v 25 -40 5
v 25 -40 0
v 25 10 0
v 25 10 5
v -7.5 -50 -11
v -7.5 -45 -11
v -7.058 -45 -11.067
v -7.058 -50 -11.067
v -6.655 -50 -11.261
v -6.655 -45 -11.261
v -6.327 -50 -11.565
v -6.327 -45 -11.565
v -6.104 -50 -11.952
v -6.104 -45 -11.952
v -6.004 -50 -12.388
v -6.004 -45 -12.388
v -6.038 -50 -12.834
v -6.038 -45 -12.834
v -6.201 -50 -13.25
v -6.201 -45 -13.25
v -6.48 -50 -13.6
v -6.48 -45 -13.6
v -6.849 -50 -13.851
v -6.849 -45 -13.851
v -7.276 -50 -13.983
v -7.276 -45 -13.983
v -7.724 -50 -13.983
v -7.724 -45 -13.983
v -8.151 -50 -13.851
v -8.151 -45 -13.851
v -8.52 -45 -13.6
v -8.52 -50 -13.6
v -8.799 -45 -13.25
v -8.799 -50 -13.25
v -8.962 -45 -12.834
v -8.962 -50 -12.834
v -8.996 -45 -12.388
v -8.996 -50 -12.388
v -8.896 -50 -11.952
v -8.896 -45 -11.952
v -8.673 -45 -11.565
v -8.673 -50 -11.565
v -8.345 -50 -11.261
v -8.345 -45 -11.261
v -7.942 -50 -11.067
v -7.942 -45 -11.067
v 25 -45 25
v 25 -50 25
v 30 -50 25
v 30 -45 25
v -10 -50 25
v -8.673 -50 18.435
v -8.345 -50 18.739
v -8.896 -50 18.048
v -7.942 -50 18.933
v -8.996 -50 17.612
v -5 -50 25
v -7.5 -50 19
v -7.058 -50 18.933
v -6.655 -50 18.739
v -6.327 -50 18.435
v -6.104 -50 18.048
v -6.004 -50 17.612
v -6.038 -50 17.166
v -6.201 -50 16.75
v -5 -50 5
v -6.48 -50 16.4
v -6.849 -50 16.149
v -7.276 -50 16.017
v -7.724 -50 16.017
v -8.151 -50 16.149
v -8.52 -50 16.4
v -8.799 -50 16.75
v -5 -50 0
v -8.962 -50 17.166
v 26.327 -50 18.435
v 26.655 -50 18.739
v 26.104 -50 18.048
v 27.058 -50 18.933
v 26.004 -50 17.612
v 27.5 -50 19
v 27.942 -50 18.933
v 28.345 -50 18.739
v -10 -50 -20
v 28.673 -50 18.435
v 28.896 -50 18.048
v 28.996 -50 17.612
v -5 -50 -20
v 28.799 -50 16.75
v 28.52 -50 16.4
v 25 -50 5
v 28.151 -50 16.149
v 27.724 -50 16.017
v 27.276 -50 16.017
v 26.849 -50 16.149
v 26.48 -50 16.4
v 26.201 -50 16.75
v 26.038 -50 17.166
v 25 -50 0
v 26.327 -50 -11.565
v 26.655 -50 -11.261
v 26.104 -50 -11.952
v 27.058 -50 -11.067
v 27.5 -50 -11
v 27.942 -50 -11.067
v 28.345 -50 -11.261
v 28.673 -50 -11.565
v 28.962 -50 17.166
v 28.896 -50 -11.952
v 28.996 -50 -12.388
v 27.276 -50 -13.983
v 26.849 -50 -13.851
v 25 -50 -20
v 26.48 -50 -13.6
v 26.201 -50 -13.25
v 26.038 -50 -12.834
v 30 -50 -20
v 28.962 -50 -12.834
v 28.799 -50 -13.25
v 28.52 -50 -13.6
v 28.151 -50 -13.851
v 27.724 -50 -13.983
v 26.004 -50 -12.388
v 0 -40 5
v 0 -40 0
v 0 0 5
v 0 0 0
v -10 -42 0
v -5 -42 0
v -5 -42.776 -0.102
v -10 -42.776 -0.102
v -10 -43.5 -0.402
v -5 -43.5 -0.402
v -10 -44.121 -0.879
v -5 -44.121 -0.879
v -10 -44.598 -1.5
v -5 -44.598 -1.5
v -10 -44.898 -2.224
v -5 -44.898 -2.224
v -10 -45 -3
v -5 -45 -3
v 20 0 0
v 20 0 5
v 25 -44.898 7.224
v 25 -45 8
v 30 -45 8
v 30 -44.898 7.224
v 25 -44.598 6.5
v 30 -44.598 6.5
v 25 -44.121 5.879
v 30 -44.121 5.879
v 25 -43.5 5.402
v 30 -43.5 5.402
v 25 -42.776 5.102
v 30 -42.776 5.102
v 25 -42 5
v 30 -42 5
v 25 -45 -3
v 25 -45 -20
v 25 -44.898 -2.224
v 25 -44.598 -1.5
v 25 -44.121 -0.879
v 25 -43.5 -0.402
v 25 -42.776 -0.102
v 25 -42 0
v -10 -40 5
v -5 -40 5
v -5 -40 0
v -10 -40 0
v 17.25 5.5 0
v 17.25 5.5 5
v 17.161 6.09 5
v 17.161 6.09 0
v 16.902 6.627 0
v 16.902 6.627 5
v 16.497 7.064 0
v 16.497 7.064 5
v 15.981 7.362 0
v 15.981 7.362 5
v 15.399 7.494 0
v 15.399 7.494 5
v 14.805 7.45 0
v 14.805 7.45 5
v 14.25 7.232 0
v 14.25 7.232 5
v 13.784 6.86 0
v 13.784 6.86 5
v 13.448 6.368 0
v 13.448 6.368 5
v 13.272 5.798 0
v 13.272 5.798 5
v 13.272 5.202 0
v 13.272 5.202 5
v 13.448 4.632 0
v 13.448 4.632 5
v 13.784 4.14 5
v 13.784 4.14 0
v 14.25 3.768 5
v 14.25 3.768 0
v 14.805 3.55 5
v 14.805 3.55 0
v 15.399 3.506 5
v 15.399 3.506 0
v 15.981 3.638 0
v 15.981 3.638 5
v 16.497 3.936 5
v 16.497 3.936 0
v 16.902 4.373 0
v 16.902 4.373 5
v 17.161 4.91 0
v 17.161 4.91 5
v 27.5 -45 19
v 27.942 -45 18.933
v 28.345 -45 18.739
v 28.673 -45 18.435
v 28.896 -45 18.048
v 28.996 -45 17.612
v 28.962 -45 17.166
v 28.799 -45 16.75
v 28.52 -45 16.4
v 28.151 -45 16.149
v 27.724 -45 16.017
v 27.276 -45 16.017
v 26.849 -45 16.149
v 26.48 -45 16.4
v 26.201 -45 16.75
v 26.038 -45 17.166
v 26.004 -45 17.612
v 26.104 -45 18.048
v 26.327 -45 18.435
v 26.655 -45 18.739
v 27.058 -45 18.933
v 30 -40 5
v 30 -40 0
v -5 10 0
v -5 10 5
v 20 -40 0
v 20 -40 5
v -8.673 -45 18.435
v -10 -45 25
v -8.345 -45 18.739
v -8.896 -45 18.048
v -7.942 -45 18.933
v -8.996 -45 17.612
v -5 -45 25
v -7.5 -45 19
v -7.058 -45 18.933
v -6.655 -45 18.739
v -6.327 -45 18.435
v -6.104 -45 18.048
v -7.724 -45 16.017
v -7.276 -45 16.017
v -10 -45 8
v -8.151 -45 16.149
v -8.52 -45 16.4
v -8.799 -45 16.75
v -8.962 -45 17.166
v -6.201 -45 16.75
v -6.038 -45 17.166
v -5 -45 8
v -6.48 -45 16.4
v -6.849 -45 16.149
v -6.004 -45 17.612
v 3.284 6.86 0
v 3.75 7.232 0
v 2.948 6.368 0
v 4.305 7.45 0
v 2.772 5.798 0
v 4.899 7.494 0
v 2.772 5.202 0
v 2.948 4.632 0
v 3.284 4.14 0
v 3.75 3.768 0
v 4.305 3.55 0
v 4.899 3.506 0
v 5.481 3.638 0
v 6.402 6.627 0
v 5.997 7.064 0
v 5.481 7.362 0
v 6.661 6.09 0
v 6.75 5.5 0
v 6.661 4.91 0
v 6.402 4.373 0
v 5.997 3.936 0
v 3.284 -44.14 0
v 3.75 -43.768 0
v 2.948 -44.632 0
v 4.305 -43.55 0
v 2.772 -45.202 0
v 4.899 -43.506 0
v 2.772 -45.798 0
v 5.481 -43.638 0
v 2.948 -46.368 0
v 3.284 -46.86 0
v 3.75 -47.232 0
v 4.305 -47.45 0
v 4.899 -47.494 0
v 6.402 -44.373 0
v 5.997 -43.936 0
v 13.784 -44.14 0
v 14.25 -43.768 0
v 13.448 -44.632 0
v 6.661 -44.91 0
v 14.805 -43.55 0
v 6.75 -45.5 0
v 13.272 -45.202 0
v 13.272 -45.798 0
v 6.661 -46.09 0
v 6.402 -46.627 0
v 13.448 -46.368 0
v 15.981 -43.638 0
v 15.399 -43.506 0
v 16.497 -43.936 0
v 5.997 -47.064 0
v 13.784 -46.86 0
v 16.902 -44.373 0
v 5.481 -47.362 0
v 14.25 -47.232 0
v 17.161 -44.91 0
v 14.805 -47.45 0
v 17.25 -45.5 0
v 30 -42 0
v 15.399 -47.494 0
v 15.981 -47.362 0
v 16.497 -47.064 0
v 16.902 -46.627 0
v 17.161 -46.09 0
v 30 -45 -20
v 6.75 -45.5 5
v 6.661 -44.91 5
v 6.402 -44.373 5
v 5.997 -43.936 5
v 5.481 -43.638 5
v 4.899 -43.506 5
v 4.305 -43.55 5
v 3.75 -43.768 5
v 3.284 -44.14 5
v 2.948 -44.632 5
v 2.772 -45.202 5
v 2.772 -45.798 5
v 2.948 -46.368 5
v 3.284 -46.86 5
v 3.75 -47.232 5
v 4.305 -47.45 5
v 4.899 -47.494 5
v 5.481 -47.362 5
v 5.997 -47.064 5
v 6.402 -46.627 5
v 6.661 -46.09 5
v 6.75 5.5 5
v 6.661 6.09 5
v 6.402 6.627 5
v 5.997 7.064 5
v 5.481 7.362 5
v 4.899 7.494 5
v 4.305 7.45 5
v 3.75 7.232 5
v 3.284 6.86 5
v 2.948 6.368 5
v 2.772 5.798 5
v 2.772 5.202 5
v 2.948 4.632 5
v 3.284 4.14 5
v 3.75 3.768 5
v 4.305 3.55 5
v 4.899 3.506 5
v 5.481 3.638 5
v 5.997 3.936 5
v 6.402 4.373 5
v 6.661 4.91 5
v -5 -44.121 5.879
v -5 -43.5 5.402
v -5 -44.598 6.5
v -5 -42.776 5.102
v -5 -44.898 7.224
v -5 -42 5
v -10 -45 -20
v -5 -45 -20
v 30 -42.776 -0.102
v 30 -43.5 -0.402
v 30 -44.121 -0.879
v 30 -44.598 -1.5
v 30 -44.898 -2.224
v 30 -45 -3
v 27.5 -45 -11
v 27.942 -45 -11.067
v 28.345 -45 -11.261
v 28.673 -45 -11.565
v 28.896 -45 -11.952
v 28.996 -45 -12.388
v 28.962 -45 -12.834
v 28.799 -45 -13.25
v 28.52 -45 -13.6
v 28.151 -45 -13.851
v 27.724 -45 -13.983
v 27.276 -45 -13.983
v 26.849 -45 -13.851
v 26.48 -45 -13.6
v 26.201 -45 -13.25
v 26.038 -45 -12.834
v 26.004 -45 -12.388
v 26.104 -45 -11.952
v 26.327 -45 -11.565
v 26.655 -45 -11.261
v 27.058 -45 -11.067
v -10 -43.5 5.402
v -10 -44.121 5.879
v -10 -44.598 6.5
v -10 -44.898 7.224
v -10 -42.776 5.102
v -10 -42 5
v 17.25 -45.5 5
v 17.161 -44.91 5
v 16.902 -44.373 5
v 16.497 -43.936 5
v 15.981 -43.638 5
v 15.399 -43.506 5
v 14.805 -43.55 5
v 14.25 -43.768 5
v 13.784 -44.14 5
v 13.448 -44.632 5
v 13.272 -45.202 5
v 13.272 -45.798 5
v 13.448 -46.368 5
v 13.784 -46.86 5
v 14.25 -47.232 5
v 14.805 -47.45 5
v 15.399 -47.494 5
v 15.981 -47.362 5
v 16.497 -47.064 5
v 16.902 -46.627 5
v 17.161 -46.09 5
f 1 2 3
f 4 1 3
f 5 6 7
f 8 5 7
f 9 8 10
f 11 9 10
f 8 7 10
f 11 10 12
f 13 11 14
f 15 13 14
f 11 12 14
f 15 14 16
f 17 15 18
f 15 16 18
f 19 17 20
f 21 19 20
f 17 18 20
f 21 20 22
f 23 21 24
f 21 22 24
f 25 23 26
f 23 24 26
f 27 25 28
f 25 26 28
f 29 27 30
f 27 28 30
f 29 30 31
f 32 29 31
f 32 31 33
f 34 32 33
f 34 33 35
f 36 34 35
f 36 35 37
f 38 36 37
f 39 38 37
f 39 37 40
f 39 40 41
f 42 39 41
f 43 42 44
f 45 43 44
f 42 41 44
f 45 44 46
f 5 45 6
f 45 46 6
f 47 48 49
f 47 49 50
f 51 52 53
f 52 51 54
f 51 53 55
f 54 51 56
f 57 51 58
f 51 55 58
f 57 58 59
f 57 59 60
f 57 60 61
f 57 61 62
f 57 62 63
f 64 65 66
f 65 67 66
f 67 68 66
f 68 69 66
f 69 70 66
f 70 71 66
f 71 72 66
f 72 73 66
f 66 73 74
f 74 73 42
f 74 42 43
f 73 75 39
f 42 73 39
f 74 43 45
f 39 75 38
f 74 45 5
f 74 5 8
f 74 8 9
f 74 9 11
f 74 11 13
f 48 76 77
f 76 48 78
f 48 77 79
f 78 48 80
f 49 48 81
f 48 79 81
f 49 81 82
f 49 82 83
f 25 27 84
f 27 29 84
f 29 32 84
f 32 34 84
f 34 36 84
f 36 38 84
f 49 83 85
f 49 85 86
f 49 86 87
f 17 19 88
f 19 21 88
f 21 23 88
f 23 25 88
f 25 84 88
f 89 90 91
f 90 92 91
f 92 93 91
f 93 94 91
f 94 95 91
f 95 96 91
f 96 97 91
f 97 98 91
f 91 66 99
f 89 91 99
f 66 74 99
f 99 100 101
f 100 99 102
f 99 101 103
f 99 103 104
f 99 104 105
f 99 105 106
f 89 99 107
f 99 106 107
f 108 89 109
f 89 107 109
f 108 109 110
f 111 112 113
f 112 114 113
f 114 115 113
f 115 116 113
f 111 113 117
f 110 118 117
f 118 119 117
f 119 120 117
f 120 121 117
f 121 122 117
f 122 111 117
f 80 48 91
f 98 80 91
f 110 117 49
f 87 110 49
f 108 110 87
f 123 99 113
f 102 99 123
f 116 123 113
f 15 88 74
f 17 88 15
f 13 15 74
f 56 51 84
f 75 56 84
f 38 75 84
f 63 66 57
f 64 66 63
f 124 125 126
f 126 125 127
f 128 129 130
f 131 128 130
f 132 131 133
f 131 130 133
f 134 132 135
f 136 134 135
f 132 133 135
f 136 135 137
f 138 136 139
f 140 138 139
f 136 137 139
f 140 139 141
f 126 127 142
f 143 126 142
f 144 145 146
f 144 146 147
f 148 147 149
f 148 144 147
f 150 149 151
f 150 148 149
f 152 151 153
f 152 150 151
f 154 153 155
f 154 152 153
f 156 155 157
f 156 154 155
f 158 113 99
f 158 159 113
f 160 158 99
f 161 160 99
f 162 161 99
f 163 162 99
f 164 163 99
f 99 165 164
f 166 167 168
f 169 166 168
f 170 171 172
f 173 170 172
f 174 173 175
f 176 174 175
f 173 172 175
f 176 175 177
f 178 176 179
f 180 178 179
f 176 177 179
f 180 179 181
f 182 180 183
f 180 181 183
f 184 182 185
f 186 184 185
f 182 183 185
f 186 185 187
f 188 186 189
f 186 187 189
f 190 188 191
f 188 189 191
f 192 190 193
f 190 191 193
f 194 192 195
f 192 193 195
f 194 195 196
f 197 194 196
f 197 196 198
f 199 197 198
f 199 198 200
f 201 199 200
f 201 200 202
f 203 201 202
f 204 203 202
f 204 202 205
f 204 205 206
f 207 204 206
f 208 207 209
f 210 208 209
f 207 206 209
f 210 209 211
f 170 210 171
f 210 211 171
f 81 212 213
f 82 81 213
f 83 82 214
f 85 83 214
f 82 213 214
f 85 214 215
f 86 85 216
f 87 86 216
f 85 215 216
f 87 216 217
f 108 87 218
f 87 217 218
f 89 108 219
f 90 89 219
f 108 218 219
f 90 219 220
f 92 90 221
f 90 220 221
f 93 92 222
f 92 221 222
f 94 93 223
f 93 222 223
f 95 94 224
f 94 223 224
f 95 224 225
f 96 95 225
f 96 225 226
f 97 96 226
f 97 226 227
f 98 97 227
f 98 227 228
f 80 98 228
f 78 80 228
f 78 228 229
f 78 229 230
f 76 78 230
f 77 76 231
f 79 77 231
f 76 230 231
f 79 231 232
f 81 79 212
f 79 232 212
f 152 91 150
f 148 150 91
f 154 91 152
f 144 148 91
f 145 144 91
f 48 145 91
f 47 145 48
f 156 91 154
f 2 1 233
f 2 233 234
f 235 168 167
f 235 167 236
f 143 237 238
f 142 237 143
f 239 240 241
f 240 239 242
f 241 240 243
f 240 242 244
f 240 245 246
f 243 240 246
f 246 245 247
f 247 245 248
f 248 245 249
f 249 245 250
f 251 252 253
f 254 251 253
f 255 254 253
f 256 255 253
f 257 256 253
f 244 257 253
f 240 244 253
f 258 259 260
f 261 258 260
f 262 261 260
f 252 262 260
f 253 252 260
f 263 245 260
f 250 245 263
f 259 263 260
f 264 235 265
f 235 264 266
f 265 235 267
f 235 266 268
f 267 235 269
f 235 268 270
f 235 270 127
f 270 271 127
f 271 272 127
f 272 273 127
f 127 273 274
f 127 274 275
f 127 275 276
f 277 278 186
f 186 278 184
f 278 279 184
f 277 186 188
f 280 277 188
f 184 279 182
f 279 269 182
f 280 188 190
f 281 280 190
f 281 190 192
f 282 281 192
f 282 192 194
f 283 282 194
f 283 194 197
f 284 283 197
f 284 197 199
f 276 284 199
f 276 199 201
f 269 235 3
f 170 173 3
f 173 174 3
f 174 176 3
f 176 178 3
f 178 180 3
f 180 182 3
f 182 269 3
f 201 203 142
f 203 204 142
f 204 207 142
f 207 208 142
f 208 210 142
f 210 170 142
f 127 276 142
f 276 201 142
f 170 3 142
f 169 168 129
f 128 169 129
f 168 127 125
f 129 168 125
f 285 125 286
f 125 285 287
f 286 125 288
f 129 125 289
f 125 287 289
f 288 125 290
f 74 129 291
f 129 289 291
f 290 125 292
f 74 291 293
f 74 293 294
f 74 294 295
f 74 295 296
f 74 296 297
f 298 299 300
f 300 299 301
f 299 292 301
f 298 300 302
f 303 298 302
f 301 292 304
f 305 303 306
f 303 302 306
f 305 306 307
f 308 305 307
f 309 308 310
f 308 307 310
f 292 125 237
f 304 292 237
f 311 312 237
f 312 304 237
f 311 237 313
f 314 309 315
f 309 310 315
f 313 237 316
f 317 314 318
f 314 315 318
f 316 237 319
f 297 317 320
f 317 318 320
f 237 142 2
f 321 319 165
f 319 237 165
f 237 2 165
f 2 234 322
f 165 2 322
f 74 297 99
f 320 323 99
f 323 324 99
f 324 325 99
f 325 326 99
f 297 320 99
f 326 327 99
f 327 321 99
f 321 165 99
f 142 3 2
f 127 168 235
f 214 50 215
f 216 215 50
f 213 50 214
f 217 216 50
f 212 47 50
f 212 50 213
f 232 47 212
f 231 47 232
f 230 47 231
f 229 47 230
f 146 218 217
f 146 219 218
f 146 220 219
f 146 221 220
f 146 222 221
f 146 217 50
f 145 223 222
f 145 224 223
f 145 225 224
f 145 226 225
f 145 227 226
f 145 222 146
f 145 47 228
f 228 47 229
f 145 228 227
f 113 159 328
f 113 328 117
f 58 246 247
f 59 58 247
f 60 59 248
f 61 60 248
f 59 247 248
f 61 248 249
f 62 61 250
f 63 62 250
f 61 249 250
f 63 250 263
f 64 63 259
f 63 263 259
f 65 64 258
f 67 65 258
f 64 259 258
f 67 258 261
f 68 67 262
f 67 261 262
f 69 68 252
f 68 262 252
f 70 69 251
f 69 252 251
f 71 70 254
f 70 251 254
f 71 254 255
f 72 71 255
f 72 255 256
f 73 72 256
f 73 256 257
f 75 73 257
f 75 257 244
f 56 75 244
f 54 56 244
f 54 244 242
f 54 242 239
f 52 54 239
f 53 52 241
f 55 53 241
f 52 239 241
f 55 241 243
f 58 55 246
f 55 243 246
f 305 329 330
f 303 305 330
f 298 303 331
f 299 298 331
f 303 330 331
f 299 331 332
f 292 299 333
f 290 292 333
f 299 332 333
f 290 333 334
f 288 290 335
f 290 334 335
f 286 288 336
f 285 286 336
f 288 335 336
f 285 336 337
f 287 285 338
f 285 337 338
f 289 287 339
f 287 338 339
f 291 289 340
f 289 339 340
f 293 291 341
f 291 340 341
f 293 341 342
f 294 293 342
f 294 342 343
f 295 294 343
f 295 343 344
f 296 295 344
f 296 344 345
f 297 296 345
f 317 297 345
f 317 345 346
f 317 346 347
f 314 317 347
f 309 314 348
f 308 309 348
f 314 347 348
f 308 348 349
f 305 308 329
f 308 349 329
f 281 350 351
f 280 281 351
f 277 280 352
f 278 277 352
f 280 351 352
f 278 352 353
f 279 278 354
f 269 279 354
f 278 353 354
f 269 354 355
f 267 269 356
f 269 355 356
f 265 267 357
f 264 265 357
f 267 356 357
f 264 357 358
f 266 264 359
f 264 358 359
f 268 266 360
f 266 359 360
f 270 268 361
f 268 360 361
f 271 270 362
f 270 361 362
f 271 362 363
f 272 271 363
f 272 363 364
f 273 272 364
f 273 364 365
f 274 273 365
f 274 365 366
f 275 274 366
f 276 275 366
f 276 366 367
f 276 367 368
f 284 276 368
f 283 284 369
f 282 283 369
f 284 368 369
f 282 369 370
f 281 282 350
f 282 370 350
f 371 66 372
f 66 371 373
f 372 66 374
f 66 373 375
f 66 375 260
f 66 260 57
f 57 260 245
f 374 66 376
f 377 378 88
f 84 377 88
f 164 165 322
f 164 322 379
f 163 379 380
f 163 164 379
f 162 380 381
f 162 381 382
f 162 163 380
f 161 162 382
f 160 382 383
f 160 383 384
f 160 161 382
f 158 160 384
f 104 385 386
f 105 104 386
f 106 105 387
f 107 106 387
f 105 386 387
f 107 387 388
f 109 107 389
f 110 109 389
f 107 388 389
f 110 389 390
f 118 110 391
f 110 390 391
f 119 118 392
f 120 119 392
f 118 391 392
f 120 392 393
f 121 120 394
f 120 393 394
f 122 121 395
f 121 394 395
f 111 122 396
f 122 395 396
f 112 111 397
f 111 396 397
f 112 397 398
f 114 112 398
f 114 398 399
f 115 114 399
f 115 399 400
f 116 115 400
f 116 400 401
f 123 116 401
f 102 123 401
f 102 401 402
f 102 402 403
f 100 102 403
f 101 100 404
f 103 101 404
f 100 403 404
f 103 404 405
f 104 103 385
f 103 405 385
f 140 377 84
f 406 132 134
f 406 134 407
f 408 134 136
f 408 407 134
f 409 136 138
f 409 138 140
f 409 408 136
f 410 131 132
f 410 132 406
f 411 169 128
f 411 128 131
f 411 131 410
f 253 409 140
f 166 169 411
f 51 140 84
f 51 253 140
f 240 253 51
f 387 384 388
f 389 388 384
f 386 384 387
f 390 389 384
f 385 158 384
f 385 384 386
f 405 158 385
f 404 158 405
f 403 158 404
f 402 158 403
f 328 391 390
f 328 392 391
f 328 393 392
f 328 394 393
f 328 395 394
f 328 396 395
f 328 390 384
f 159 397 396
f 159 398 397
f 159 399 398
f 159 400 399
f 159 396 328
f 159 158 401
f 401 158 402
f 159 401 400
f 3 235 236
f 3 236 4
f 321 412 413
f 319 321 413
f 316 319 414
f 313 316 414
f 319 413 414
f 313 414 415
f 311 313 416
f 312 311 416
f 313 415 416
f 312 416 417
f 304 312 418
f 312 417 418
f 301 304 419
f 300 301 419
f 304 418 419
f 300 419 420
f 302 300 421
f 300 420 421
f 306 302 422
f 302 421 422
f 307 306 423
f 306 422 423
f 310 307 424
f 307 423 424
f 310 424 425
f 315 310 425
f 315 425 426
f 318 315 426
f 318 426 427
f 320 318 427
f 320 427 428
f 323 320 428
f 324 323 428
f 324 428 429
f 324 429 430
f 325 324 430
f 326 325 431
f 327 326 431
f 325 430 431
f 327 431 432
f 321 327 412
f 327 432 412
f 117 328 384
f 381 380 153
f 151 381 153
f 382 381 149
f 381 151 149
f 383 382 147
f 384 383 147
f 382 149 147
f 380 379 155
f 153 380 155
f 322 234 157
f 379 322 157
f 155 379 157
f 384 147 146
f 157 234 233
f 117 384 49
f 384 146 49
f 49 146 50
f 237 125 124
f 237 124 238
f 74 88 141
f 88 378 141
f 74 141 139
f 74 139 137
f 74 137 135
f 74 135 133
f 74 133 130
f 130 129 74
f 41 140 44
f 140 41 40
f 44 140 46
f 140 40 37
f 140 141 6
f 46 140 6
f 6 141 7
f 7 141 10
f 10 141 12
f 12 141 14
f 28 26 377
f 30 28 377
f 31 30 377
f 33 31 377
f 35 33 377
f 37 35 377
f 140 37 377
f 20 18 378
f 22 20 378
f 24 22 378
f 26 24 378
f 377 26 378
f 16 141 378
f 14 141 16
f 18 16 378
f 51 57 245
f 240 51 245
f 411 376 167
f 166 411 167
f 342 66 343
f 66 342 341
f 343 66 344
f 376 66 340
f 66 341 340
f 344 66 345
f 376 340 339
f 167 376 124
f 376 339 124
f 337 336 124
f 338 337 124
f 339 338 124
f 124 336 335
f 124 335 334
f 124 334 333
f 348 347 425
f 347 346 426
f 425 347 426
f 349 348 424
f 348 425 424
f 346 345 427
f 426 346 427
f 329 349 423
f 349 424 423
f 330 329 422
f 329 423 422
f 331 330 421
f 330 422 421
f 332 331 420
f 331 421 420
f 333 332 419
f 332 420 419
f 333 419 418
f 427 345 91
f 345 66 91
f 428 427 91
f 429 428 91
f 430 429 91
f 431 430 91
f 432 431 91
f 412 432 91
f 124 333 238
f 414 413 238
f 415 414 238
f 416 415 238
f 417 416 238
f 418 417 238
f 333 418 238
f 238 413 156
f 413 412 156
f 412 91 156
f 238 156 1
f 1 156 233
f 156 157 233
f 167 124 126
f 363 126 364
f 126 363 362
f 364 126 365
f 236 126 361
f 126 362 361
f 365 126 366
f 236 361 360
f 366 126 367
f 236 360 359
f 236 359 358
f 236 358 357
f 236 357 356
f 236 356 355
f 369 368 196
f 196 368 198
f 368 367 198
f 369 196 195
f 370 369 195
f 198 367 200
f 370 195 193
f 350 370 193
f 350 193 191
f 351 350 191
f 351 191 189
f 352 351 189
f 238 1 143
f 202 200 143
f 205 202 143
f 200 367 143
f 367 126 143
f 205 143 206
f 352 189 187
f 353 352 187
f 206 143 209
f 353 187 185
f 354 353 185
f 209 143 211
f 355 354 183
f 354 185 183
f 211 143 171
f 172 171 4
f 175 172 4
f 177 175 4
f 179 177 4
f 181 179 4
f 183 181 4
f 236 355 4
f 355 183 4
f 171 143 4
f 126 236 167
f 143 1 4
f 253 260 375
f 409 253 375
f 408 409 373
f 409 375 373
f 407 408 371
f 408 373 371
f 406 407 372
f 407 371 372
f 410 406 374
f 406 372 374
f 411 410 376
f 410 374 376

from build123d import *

# Parameters (mm, degrees)
SKETCH_2_W          = 30
SKETCH_2_H          = 60
SKETCH_2_W_2        = 20
SKETCH_2_H_2        = 40
EXTRUDE_1_DEPTH     = 5
SKETCH_3_R          = 2
CUT_EXTRUDE_1_DEPTH = 5
EXTRUDE_2_DEPTH     = 5
SKETCH_6_R          = 1.5
CUT_EXTRUDE_2_DEPTH = 5


with BuildPart() as part:
    # 草图2 → 凸台-拉伸1 (new body)
    with BuildSketch(Plane.XY):
        with Locations((10, -20)):
            Rectangle(SKETCH_2_W, SKETCH_2_H)
        with Locations((10, -20)):
            Rectangle(SKETCH_2_W_2, SKETCH_2_H_2, mode=Mode.SUBTRACT)
    extrude(amount=EXTRUDE_1_DEPTH)

    # 草图3 → 切除-拉伸1 (cut)
    with BuildSketch(Plane.XY.offset(5)):
        with Locations((15.25, 5.5)):
            Circle(SKETCH_3_R)
        with Locations((15.25, -45.5)):
            Circle(SKETCH_3_R)
        with Locations((4.75, -45.5)):
            Circle(SKETCH_3_R)
        with Locations((4.75, 5.5)):
            Circle(SKETCH_3_R)
    extrude(amount=-CUT_EXTRUDE_1_DEPTH, mode=Mode.SUBTRACT)

    # 草图5 → 凸台-拉伸2 (add)
    with BuildSketch(Plane(origin=(25, 0, 0), x_dir=(0, 0, -1), z_dir=(1, 0, 0))):
        with BuildLine():
            Line((-5, -42), (-5, -40))
            Line((-5, -40), (0, -40))
            Line((0, -40), (0, -42))
            ThreePointArc((0, -42), (0.878679656, -44.121320344), (3, -45))
            Line((3, -45), (20, -45))
            Line((20, -45), (20, -50))
            Line((20, -50), (0, -50))
            Line((0, -50), (-5, -50))
            Line((-5, -50), (-25, -50))
            Line((-25, -50), (-25, -45))
            Line((-25, -45), (-8, -45))
            ThreePointArc((-8, -45), (-5.878679656, -44.121320344), (-5, -42))
        make_face()
    extrude_2 = extrude(amount=EXTRUDE_2_DEPTH)

    # 镜向1: 凸台-拉伸2 across plane
    add(extrude_2.mirror(Plane(origin=(10, 0, 0), x_dir=(0, 0, 1), z_dir=(1, 0, 0))))

    # 草图6 → 切除-拉伸2 (cut)
    with BuildSketch(Plane(origin=(0, -45, 0), x_dir=(1, 0, 0), z_dir=(0, 1, 0))):
        with Locations(Location((-7.5, 12.5, 0), (0, 0, 270))):
            Circle(SKETCH_6_R)
        with Locations(Location((-7.5, -17.5, 0), (0, 0, 270))):
            Circle(SKETCH_6_R)
        with Locations(Location((27.5, -17.5, 0), (0, 0, 270))):
            Circle(SKETCH_6_R)
        with Locations(Location((27.5, 12.5, 0), (0, 0, 270))):
            Circle(SKETCH_6_R)
    extrude(amount=-CUT_EXTRUDE_2_DEPTH, mode=Mode.SUBTRACT)


solid = part.part
